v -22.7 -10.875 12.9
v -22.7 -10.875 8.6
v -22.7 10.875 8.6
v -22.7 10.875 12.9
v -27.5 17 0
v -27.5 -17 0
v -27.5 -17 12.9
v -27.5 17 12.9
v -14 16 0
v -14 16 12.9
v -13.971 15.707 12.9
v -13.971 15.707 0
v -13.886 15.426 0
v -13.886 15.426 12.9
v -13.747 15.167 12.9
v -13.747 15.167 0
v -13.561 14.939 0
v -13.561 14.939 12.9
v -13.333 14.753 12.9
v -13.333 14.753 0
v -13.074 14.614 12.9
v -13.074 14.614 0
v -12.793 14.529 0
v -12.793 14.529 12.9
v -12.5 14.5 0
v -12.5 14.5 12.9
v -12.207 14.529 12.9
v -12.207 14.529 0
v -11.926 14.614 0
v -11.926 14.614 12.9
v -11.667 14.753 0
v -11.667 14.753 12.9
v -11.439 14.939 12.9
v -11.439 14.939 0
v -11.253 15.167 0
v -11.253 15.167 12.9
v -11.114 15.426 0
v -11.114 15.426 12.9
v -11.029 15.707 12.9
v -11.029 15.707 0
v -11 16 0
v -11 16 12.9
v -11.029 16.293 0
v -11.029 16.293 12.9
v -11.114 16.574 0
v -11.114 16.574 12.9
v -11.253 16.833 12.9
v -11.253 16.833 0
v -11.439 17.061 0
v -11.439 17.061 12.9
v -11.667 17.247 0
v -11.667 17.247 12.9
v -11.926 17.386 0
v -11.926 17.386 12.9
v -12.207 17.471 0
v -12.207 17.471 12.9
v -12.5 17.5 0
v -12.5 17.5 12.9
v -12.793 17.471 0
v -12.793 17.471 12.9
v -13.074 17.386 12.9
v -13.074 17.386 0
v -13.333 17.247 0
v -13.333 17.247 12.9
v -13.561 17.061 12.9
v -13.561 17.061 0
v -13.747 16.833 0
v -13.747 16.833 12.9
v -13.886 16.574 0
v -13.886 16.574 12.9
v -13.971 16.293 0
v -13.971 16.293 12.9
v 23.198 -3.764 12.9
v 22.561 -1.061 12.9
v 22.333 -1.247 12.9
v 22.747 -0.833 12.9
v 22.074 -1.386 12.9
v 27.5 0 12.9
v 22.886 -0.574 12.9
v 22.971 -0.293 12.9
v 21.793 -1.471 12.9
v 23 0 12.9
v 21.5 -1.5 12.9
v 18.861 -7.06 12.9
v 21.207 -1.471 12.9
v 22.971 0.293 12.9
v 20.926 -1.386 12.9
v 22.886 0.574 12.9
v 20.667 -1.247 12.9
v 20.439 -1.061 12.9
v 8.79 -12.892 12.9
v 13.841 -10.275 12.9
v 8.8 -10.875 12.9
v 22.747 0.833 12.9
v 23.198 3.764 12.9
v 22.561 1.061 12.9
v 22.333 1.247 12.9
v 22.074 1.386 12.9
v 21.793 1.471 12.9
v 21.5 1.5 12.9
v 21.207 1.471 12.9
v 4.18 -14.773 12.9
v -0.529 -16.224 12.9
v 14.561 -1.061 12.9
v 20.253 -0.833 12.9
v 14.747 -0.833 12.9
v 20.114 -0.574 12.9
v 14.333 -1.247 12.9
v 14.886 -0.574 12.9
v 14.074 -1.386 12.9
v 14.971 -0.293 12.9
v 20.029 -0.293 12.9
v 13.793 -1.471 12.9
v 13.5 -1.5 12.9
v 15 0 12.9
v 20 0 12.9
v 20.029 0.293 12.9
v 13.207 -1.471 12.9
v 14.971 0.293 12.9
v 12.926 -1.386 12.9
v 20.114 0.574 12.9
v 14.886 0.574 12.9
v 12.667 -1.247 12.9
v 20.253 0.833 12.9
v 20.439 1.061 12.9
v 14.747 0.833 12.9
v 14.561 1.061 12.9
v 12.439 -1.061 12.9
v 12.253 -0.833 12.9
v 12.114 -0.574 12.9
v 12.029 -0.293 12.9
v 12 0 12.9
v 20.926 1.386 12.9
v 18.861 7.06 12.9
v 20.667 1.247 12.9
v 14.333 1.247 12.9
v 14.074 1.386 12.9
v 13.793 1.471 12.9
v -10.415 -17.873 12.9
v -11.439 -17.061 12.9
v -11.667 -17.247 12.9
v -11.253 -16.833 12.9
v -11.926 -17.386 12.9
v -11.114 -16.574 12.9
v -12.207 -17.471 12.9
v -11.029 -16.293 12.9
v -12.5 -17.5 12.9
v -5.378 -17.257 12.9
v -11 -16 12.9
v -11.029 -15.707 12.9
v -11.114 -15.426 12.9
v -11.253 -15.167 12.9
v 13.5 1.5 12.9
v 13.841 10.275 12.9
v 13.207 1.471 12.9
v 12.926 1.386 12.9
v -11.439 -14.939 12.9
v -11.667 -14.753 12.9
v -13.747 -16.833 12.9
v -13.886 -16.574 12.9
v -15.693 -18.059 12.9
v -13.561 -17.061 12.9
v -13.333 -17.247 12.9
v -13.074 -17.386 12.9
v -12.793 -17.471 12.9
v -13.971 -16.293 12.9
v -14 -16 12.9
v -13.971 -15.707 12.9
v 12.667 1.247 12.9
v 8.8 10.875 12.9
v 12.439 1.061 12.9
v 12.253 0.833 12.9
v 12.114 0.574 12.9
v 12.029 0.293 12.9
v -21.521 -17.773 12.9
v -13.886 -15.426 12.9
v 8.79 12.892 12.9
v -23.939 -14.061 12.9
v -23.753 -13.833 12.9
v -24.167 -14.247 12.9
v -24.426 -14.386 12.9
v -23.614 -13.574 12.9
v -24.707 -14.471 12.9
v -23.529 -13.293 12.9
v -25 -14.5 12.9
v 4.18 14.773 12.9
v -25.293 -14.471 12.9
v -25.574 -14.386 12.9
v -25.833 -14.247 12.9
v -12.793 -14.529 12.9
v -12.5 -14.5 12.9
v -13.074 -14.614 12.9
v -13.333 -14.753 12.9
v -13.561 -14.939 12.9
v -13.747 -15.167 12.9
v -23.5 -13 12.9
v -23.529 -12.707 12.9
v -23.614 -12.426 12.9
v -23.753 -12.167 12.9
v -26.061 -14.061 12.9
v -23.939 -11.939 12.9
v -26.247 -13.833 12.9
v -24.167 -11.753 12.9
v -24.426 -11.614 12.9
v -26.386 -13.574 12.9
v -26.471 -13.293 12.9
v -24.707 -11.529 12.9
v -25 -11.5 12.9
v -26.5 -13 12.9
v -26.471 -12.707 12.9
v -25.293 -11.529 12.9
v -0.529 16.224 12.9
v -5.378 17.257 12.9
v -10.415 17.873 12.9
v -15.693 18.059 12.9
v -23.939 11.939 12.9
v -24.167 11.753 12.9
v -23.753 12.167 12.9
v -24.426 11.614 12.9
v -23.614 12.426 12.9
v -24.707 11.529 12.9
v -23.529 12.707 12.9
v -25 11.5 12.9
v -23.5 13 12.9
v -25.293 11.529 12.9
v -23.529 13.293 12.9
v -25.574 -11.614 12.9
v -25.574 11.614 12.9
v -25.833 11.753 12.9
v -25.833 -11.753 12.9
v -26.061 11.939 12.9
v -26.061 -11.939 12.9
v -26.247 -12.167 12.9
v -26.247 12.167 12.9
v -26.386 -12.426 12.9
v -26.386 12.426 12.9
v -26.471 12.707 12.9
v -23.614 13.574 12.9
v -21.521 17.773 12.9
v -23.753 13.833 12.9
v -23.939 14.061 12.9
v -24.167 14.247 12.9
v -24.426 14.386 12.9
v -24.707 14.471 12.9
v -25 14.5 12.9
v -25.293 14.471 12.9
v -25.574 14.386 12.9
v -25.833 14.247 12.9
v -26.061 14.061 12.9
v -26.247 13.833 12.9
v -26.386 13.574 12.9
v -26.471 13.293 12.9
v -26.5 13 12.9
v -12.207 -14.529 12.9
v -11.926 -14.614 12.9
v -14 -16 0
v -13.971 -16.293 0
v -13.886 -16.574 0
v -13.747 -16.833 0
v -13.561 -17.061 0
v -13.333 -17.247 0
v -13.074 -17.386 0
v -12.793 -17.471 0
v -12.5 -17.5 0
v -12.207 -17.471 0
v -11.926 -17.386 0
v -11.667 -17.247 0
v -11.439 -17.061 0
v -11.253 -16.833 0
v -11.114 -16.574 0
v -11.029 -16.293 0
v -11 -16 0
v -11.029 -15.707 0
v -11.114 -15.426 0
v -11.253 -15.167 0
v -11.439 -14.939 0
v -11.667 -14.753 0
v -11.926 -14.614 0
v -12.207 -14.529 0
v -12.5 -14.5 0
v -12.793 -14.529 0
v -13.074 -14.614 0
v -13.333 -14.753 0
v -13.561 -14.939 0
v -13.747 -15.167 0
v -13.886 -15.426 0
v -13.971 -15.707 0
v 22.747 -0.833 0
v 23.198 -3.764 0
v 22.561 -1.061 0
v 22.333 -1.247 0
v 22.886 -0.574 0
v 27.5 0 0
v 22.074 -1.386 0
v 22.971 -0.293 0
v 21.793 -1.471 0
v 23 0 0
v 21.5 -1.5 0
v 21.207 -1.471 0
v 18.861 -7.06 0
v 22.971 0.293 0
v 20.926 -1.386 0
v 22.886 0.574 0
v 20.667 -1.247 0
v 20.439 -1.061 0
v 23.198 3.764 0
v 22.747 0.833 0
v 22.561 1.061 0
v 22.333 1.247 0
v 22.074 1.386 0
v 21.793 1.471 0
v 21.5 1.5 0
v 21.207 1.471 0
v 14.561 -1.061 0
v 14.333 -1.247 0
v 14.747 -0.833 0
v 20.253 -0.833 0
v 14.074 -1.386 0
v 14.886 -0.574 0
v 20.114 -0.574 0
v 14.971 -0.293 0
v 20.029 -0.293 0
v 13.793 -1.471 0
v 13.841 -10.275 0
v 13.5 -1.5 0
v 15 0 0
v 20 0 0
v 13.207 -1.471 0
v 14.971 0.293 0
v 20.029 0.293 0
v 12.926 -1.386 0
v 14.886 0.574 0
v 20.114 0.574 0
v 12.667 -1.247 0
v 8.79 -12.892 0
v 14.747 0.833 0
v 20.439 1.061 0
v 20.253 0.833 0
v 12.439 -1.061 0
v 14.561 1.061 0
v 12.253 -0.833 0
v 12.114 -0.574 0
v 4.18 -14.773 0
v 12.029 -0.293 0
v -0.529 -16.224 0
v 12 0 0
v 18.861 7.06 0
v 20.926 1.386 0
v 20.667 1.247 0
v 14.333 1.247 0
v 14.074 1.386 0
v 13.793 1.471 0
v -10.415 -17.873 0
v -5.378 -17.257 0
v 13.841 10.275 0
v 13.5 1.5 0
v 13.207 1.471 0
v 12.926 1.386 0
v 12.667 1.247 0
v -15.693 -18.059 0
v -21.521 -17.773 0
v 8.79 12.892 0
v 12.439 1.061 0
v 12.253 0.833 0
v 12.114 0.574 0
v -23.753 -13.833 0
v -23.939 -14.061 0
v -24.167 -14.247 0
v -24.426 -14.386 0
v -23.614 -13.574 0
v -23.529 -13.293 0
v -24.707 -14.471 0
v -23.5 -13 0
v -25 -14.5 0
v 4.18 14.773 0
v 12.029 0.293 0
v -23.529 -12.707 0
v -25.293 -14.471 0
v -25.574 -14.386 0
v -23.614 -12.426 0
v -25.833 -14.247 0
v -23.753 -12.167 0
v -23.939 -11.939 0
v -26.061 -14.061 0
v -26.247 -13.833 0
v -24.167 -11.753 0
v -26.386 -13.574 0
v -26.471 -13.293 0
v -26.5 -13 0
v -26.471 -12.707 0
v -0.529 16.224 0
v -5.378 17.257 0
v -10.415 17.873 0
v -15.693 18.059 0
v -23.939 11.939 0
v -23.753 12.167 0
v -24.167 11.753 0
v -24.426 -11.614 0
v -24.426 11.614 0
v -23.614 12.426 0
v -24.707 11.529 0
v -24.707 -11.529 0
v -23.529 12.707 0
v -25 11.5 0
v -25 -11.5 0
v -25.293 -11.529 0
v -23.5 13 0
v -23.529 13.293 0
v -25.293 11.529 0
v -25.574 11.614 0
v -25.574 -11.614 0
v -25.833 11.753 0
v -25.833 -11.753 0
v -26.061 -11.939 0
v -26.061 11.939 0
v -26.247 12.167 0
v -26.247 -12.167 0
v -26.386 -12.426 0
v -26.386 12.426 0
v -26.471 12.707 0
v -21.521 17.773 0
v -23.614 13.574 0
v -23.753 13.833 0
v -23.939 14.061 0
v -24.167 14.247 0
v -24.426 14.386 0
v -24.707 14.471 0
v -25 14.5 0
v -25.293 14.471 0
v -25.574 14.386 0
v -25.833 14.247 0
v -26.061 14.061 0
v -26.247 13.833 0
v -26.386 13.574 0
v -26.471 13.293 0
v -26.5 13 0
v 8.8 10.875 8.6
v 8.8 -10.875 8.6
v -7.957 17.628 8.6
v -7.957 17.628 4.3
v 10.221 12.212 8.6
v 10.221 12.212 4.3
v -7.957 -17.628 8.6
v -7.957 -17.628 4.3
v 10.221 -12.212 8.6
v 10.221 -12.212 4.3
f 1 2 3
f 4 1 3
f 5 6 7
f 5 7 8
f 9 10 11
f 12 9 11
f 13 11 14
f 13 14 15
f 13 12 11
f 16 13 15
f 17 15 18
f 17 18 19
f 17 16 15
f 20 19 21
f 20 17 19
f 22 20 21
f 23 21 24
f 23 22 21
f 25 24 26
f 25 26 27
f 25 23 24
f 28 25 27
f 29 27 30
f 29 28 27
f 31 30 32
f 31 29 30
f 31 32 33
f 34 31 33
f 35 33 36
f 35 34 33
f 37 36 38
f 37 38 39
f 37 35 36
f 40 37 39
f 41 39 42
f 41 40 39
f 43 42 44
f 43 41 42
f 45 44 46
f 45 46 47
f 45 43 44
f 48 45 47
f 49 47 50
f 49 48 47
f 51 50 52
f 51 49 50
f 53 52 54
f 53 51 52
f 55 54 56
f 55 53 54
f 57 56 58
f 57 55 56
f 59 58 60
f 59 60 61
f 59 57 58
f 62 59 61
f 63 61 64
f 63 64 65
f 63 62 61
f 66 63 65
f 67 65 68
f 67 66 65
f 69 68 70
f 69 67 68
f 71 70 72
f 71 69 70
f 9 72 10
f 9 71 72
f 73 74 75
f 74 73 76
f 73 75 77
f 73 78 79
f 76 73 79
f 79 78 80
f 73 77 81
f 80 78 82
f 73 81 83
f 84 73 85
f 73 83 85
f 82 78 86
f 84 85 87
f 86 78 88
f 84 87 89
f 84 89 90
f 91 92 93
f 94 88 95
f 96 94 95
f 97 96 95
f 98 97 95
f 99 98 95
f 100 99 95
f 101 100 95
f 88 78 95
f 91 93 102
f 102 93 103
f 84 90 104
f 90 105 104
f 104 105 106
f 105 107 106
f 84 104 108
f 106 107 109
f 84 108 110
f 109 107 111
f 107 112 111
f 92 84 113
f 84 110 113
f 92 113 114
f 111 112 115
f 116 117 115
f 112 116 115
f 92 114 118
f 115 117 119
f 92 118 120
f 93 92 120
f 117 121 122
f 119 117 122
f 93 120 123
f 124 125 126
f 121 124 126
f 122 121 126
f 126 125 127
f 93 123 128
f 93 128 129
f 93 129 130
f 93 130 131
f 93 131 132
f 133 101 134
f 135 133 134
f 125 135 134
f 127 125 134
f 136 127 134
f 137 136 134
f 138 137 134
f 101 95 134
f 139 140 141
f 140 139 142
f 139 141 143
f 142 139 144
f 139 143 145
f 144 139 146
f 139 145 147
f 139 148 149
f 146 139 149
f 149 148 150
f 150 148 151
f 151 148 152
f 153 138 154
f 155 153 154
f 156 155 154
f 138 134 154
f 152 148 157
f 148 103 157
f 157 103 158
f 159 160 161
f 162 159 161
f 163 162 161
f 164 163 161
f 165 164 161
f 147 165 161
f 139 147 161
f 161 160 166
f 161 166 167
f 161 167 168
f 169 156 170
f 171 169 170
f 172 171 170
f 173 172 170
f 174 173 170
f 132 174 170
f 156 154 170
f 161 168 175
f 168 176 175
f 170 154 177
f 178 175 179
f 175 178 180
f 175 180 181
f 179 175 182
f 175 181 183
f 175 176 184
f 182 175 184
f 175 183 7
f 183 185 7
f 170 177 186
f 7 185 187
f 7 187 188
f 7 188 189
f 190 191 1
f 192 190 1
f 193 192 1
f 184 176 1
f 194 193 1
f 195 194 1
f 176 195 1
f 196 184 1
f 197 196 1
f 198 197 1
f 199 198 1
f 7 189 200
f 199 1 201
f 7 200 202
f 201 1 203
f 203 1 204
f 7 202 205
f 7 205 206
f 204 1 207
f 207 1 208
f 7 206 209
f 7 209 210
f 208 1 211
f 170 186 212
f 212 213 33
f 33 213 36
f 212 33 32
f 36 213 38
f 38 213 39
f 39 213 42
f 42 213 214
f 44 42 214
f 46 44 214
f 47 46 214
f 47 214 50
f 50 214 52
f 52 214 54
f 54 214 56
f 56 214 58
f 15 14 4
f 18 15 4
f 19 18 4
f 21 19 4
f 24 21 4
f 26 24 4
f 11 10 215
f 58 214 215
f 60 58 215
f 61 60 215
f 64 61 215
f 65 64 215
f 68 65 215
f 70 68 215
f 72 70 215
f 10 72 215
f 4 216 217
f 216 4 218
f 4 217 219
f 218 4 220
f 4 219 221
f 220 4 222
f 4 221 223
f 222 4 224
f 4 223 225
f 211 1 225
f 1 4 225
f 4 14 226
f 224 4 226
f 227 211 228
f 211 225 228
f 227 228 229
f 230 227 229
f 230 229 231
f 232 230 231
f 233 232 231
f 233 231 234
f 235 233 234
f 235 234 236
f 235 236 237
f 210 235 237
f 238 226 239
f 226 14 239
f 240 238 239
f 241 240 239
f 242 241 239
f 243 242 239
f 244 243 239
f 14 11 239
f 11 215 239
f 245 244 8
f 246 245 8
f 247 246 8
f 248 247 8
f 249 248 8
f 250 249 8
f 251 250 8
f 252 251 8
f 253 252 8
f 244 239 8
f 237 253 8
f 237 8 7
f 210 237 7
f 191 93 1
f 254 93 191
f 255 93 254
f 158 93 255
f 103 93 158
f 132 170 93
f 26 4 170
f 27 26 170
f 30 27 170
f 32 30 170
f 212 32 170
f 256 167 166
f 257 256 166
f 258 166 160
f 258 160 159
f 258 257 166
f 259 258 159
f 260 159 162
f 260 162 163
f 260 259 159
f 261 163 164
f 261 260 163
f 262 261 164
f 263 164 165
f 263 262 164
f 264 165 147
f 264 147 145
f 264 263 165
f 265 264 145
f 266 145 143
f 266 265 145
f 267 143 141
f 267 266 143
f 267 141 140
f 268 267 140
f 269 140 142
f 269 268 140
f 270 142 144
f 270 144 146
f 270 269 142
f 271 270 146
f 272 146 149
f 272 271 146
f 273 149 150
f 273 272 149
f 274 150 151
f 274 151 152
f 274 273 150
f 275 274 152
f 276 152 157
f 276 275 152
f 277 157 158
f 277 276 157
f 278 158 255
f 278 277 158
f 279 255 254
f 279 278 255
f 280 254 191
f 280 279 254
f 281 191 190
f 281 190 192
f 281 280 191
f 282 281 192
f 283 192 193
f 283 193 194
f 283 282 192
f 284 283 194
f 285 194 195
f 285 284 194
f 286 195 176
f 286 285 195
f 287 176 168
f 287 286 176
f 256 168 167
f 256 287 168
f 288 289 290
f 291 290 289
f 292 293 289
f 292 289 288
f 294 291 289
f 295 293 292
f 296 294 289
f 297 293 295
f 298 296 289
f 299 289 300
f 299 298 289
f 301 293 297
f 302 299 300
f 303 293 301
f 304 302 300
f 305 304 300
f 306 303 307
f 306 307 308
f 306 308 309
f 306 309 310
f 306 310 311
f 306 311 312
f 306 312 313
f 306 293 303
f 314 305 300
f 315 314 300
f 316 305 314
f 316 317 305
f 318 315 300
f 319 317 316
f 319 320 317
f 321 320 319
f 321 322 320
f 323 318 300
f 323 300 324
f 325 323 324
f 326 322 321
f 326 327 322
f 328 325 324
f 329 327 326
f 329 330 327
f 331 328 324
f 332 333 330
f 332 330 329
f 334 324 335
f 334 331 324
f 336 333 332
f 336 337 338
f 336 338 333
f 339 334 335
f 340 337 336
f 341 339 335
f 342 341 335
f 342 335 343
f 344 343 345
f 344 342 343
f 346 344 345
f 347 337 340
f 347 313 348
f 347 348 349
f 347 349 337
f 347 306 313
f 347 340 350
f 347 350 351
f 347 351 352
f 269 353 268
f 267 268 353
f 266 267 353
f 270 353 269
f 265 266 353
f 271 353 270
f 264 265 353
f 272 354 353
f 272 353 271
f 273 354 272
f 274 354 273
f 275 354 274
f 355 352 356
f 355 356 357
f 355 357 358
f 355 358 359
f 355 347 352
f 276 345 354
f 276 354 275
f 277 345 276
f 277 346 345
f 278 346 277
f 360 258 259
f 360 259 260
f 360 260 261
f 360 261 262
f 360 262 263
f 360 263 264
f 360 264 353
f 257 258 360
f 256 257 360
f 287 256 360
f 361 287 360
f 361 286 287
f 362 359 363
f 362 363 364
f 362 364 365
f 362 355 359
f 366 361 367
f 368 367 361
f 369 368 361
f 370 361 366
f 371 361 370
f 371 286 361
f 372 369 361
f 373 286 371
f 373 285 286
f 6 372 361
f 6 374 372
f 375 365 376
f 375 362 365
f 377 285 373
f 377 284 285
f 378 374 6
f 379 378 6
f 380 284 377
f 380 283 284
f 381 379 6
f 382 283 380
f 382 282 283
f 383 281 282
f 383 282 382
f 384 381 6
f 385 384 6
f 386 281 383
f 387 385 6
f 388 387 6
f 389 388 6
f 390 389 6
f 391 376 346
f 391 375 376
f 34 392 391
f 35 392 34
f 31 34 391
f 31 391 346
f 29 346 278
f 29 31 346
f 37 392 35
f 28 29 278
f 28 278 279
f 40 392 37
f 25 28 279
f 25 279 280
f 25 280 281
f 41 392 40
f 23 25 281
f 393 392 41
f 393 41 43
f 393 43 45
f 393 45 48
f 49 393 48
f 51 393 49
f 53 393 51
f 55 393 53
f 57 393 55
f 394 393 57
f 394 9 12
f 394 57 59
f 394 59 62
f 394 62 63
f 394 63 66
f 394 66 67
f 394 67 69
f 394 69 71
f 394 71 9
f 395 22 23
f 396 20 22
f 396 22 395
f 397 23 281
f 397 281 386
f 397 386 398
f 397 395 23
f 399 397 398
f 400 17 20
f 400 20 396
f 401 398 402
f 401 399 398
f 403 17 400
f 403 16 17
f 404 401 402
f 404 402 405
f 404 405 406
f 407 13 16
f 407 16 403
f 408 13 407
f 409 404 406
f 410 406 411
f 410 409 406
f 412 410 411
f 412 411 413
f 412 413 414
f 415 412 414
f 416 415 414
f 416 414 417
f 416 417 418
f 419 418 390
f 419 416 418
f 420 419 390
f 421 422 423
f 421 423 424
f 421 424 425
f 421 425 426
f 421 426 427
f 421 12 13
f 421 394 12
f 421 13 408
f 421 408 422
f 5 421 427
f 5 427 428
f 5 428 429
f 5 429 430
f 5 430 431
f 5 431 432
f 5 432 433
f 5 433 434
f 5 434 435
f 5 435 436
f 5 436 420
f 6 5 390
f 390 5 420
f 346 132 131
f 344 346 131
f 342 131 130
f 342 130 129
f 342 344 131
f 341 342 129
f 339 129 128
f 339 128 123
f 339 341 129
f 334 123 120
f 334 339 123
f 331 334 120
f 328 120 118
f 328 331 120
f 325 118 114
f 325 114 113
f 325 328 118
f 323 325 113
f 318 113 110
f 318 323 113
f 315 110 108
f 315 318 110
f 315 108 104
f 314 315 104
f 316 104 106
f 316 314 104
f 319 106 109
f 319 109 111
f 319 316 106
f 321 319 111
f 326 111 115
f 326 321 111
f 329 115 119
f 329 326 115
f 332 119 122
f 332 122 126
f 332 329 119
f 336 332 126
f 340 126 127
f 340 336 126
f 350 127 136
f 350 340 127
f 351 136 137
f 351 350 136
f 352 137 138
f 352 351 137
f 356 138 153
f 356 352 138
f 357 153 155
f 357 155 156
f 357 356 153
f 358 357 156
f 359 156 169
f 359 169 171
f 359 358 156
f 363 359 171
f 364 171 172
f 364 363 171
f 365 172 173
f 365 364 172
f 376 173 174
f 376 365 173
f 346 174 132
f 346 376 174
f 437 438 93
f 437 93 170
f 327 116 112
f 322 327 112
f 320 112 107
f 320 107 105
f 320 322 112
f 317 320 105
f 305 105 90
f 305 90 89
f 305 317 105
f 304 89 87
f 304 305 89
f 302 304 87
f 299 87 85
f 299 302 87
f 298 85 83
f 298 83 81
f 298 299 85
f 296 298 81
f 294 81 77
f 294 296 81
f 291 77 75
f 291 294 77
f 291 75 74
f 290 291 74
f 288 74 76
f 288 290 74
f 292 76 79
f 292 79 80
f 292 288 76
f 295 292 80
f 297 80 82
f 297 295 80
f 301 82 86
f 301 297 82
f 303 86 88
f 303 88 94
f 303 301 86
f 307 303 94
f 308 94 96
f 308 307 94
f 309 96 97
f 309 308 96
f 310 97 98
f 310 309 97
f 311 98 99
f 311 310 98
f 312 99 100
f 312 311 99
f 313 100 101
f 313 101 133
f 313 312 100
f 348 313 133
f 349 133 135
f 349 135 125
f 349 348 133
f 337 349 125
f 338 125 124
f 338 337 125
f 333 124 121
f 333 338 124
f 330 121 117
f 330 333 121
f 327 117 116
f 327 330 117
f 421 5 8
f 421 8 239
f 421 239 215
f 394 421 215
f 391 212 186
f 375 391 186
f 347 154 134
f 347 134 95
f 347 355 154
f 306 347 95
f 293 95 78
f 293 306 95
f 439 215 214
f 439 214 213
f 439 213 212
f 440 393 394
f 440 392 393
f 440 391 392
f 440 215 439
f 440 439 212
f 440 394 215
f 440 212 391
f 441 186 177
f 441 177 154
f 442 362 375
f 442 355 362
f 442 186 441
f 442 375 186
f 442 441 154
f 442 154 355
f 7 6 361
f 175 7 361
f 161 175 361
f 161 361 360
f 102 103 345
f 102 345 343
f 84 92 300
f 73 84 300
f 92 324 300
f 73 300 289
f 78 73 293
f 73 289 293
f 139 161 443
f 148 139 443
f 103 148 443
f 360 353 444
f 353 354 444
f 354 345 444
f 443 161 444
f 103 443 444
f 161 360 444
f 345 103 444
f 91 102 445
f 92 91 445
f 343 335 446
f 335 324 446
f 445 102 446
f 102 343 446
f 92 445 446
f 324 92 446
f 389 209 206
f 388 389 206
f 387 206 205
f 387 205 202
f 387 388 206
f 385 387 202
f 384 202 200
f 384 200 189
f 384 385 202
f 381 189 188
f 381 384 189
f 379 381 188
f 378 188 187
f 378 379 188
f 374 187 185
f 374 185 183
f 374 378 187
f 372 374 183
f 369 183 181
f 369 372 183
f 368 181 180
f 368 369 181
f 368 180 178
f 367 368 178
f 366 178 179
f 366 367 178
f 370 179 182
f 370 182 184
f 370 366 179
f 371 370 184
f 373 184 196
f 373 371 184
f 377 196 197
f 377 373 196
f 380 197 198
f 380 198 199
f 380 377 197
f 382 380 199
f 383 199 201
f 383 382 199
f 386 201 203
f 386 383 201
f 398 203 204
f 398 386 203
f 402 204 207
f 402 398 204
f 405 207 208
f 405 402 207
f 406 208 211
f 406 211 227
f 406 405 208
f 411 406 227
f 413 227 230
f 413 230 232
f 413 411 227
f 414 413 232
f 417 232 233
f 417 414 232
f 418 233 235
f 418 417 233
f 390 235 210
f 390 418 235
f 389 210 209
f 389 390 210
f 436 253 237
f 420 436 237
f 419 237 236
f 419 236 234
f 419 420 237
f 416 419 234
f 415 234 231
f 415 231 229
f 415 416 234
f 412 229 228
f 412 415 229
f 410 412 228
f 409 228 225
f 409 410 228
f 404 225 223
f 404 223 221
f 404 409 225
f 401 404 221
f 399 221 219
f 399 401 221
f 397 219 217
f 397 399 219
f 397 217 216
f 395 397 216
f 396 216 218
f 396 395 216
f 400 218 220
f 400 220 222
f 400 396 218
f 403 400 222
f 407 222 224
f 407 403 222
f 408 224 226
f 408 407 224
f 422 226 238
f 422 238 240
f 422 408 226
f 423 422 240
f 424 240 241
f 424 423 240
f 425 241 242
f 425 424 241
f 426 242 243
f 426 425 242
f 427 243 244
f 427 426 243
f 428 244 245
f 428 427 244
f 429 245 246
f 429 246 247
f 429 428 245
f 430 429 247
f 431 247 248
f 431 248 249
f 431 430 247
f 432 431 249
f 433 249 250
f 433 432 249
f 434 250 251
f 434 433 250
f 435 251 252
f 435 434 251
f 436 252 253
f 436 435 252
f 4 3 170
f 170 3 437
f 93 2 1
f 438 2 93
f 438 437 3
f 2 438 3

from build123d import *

# Parameters (mm, degrees)
SKETCH1_R           = 1.5
SKETCH1_W           = 31.5
SKETCH1_H           = 21.75
BOSS_EXTRUDE2_DEPTH = 12.9
SKETCH4_W           = 31.5
SKETCH4_H           = 21.75
BOSS_EXTRUDE3_DEPTH = 8.6


with BuildPart() as part:
    # Sketch1 → Boss-Extrude2 (new body)
    with BuildSketch(Plane.XY):
        with BuildLine():
            Line((-27.5, -17), (-27.5, 17))
            add(Edge.make_bspline(
                [(-27.5, 17), (-7.117727258, 20.399822972), (10.514459211, 15.859666911), (27.5, 0)],
                knots=[0, 0, 0, 0, 1, 1, 1, 1], degree=3))
            add(Edge.make_bspline(
                [(-27.5, -17), (-7.117727258, -20.399822972), (10.514459211, -15.859666911), (27.5, 0)],
                knots=[0, 0, 0, 0, 1, 1, 1, 1], degree=3))
        make_face()
        with Locations(Location((-25, 13, 0), (0, 0, 180))):
            Circle(SKETCH1_R, mode=Mode.SUBTRACT)
        with Locations(Location((-12.5, 16, 0), (0, 0, 180))):
            Circle(SKETCH1_R, mode=Mode.SUBTRACT)
        with Locations(Location((21.5, 0, 0), (0, 0, 180))):
            Circle(SKETCH1_R, mode=Mode.SUBTRACT)
        with Locations(Location((13.5, 0, 0), (0, 0, 180))):
            Circle(SKETCH1_R, mode=Mode.SUBTRACT)
        with Locations(Location((-12.5, -16, 0), (0, 0, 180))):
            Circle(SKETCH1_R, mode=Mode.SUBTRACT)
        with Locations(Location((-25, -13, 0), (0, 0, 180))):
            Circle(SKETCH1_R, mode=Mode.SUBTRACT)
        with Locations((-6.95, 0)):
            Rectangle(SKETCH1_W, SKETCH1_H, mode=Mode.SUBTRACT)
    extrude(amount=BOSS_EXTRUDE2_DEPTH)

    # Sketch4 → Boss-Extrude3 (add)
    with BuildSketch(Plane(origin=(0, 0, 0), x_dir=(-1, 0, 0), z_dir=(0, 0, -1))):
        with Locations((6.95, 0)):
            Rectangle(SKETCH4_W, SKETCH4_H)
    extrude(amount=-BOSS_EXTRUDE3_DEPTH)


solid = part.part
